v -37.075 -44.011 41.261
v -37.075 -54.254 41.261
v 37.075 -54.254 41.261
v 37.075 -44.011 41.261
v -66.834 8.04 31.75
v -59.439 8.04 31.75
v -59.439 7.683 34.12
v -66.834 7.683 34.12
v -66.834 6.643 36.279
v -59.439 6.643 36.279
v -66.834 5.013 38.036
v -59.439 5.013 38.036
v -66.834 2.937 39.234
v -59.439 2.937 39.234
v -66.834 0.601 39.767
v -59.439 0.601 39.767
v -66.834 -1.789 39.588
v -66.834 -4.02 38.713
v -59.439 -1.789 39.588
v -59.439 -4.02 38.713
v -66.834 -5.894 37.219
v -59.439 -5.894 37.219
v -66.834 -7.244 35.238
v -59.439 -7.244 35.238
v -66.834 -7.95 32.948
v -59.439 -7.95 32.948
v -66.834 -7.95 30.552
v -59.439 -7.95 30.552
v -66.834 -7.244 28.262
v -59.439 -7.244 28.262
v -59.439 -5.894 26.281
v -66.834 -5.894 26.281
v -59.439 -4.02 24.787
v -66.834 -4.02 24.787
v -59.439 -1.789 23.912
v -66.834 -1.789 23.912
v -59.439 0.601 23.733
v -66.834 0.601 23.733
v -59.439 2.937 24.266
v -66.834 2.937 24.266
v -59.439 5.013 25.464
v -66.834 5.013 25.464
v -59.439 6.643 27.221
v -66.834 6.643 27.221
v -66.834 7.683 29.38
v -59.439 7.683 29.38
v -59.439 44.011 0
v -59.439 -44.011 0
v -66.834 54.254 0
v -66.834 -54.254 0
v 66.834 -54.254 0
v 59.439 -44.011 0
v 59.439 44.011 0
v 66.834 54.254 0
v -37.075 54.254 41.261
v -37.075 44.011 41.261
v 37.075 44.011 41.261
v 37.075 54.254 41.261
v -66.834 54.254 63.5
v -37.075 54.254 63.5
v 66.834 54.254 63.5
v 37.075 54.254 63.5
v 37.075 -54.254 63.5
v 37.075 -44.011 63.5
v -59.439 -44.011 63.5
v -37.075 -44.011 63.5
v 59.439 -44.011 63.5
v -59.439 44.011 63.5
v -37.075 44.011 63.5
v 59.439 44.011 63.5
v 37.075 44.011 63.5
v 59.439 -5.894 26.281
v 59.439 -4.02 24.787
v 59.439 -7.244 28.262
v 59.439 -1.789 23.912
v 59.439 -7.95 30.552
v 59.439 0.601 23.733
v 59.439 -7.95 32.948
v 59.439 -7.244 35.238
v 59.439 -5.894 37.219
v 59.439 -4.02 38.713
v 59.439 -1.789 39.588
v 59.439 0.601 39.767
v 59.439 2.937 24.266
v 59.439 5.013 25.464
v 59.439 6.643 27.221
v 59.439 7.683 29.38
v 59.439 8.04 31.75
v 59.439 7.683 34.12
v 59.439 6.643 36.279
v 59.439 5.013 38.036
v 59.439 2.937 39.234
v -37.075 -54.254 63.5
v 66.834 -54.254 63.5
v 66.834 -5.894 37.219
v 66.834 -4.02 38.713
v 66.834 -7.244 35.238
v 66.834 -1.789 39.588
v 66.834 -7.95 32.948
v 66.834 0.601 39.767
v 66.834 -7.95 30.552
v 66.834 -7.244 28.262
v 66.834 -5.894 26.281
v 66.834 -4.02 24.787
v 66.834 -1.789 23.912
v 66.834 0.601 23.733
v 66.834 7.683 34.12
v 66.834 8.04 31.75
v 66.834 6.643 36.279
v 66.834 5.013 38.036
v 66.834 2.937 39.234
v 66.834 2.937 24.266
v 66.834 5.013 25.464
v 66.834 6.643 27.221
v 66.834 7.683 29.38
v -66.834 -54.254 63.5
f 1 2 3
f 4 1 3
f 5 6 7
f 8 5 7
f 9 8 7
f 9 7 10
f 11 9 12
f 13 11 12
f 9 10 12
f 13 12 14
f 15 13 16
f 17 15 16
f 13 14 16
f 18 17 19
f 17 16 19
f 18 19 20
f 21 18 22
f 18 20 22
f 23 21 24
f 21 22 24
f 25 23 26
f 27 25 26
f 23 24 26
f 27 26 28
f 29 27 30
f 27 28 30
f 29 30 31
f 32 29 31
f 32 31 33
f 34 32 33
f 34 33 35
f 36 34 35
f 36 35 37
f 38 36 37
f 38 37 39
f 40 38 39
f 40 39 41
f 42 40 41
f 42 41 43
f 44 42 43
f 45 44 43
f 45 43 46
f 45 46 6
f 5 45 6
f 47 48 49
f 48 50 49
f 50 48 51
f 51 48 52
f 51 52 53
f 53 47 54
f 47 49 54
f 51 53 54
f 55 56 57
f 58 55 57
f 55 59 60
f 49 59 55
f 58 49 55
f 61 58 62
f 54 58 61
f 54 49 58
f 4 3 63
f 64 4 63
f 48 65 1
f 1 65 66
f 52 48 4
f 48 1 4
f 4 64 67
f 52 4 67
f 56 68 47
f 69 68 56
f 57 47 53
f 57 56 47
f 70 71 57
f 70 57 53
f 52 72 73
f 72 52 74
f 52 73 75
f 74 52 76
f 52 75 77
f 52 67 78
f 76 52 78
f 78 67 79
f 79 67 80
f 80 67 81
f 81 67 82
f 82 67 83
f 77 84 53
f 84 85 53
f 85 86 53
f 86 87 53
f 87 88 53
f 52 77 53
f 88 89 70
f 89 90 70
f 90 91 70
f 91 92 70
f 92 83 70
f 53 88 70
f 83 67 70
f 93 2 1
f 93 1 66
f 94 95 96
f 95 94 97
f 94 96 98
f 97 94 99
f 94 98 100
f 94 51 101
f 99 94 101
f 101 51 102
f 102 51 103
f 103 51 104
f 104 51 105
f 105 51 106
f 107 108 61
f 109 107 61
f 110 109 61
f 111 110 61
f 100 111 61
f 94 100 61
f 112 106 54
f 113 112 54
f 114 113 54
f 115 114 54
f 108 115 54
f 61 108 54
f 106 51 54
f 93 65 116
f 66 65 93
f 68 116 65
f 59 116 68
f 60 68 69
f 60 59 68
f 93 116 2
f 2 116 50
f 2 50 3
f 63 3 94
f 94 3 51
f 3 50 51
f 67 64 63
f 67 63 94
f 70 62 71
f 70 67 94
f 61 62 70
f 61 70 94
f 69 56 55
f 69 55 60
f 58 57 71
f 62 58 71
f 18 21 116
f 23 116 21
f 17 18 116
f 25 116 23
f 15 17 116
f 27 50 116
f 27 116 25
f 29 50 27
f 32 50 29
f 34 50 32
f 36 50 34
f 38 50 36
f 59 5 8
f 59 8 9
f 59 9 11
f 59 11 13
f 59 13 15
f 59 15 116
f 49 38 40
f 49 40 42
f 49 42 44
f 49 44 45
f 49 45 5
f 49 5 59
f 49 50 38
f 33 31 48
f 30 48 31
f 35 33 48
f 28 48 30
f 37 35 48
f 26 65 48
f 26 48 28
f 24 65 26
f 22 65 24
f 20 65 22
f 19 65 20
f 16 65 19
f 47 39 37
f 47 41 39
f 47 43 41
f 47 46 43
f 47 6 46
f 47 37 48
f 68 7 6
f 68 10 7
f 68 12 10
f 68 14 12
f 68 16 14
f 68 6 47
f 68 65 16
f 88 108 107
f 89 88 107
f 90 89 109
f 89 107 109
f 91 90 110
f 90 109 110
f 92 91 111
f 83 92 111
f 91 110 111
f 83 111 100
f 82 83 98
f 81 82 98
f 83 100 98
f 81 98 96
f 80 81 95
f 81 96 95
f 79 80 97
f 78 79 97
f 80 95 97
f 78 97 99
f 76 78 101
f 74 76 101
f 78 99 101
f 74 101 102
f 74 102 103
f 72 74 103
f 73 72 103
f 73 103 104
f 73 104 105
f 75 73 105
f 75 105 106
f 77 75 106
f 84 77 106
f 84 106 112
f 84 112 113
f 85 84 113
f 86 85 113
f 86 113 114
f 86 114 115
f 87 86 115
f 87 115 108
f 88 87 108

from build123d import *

# Parameters (mm, degrees)
F0_W     = 133.668438
F0_H     = 108.508282
F1_DEPTH = 63.5
F2_R     = 8.039935
F3_DEPTH = 133.669438
F4_W     = 118.878834
F4_H     = 88.022954
F5_DEPTH = 63.501
F6_W     = 74.149776
F6_H     = 22.239236
F7_DEPTH = 108.509281


with BuildPart() as f1:
    # F0 (on Top) → F1 (new body)
    with BuildSketch(Plane.XY):
        Rectangle(F0_W, F0_H)
    extrude(amount=F1_DEPTH)

    # F2 (on face) → F3 (cut, through all)
    with BuildSketch(Plane.YZ.offset(66.834219)):
        with Locations((0, 31.75)):
            Circle(F2_R)
    extrude(amount=-F3_DEPTH, mode=Mode.SUBTRACT)

    # F4 (on face) → F5 (cut, through all)
    with BuildSketch(Plane.XY.offset(63.5)):
        Rectangle(F4_W, F4_H)
    extrude(amount=-F5_DEPTH, mode=Mode.SUBTRACT)

    # F6 (on face) → F7 (cut, through all)
    with BuildSketch(Plane.XZ.offset(54.254141)):
        with Locations((-2e-06, 52.380382)):
            Rectangle(F6_W, F6_H)
    extrude(amount=-F7_DEPTH, mode=Mode.SUBTRACT)


solid = f1.part
